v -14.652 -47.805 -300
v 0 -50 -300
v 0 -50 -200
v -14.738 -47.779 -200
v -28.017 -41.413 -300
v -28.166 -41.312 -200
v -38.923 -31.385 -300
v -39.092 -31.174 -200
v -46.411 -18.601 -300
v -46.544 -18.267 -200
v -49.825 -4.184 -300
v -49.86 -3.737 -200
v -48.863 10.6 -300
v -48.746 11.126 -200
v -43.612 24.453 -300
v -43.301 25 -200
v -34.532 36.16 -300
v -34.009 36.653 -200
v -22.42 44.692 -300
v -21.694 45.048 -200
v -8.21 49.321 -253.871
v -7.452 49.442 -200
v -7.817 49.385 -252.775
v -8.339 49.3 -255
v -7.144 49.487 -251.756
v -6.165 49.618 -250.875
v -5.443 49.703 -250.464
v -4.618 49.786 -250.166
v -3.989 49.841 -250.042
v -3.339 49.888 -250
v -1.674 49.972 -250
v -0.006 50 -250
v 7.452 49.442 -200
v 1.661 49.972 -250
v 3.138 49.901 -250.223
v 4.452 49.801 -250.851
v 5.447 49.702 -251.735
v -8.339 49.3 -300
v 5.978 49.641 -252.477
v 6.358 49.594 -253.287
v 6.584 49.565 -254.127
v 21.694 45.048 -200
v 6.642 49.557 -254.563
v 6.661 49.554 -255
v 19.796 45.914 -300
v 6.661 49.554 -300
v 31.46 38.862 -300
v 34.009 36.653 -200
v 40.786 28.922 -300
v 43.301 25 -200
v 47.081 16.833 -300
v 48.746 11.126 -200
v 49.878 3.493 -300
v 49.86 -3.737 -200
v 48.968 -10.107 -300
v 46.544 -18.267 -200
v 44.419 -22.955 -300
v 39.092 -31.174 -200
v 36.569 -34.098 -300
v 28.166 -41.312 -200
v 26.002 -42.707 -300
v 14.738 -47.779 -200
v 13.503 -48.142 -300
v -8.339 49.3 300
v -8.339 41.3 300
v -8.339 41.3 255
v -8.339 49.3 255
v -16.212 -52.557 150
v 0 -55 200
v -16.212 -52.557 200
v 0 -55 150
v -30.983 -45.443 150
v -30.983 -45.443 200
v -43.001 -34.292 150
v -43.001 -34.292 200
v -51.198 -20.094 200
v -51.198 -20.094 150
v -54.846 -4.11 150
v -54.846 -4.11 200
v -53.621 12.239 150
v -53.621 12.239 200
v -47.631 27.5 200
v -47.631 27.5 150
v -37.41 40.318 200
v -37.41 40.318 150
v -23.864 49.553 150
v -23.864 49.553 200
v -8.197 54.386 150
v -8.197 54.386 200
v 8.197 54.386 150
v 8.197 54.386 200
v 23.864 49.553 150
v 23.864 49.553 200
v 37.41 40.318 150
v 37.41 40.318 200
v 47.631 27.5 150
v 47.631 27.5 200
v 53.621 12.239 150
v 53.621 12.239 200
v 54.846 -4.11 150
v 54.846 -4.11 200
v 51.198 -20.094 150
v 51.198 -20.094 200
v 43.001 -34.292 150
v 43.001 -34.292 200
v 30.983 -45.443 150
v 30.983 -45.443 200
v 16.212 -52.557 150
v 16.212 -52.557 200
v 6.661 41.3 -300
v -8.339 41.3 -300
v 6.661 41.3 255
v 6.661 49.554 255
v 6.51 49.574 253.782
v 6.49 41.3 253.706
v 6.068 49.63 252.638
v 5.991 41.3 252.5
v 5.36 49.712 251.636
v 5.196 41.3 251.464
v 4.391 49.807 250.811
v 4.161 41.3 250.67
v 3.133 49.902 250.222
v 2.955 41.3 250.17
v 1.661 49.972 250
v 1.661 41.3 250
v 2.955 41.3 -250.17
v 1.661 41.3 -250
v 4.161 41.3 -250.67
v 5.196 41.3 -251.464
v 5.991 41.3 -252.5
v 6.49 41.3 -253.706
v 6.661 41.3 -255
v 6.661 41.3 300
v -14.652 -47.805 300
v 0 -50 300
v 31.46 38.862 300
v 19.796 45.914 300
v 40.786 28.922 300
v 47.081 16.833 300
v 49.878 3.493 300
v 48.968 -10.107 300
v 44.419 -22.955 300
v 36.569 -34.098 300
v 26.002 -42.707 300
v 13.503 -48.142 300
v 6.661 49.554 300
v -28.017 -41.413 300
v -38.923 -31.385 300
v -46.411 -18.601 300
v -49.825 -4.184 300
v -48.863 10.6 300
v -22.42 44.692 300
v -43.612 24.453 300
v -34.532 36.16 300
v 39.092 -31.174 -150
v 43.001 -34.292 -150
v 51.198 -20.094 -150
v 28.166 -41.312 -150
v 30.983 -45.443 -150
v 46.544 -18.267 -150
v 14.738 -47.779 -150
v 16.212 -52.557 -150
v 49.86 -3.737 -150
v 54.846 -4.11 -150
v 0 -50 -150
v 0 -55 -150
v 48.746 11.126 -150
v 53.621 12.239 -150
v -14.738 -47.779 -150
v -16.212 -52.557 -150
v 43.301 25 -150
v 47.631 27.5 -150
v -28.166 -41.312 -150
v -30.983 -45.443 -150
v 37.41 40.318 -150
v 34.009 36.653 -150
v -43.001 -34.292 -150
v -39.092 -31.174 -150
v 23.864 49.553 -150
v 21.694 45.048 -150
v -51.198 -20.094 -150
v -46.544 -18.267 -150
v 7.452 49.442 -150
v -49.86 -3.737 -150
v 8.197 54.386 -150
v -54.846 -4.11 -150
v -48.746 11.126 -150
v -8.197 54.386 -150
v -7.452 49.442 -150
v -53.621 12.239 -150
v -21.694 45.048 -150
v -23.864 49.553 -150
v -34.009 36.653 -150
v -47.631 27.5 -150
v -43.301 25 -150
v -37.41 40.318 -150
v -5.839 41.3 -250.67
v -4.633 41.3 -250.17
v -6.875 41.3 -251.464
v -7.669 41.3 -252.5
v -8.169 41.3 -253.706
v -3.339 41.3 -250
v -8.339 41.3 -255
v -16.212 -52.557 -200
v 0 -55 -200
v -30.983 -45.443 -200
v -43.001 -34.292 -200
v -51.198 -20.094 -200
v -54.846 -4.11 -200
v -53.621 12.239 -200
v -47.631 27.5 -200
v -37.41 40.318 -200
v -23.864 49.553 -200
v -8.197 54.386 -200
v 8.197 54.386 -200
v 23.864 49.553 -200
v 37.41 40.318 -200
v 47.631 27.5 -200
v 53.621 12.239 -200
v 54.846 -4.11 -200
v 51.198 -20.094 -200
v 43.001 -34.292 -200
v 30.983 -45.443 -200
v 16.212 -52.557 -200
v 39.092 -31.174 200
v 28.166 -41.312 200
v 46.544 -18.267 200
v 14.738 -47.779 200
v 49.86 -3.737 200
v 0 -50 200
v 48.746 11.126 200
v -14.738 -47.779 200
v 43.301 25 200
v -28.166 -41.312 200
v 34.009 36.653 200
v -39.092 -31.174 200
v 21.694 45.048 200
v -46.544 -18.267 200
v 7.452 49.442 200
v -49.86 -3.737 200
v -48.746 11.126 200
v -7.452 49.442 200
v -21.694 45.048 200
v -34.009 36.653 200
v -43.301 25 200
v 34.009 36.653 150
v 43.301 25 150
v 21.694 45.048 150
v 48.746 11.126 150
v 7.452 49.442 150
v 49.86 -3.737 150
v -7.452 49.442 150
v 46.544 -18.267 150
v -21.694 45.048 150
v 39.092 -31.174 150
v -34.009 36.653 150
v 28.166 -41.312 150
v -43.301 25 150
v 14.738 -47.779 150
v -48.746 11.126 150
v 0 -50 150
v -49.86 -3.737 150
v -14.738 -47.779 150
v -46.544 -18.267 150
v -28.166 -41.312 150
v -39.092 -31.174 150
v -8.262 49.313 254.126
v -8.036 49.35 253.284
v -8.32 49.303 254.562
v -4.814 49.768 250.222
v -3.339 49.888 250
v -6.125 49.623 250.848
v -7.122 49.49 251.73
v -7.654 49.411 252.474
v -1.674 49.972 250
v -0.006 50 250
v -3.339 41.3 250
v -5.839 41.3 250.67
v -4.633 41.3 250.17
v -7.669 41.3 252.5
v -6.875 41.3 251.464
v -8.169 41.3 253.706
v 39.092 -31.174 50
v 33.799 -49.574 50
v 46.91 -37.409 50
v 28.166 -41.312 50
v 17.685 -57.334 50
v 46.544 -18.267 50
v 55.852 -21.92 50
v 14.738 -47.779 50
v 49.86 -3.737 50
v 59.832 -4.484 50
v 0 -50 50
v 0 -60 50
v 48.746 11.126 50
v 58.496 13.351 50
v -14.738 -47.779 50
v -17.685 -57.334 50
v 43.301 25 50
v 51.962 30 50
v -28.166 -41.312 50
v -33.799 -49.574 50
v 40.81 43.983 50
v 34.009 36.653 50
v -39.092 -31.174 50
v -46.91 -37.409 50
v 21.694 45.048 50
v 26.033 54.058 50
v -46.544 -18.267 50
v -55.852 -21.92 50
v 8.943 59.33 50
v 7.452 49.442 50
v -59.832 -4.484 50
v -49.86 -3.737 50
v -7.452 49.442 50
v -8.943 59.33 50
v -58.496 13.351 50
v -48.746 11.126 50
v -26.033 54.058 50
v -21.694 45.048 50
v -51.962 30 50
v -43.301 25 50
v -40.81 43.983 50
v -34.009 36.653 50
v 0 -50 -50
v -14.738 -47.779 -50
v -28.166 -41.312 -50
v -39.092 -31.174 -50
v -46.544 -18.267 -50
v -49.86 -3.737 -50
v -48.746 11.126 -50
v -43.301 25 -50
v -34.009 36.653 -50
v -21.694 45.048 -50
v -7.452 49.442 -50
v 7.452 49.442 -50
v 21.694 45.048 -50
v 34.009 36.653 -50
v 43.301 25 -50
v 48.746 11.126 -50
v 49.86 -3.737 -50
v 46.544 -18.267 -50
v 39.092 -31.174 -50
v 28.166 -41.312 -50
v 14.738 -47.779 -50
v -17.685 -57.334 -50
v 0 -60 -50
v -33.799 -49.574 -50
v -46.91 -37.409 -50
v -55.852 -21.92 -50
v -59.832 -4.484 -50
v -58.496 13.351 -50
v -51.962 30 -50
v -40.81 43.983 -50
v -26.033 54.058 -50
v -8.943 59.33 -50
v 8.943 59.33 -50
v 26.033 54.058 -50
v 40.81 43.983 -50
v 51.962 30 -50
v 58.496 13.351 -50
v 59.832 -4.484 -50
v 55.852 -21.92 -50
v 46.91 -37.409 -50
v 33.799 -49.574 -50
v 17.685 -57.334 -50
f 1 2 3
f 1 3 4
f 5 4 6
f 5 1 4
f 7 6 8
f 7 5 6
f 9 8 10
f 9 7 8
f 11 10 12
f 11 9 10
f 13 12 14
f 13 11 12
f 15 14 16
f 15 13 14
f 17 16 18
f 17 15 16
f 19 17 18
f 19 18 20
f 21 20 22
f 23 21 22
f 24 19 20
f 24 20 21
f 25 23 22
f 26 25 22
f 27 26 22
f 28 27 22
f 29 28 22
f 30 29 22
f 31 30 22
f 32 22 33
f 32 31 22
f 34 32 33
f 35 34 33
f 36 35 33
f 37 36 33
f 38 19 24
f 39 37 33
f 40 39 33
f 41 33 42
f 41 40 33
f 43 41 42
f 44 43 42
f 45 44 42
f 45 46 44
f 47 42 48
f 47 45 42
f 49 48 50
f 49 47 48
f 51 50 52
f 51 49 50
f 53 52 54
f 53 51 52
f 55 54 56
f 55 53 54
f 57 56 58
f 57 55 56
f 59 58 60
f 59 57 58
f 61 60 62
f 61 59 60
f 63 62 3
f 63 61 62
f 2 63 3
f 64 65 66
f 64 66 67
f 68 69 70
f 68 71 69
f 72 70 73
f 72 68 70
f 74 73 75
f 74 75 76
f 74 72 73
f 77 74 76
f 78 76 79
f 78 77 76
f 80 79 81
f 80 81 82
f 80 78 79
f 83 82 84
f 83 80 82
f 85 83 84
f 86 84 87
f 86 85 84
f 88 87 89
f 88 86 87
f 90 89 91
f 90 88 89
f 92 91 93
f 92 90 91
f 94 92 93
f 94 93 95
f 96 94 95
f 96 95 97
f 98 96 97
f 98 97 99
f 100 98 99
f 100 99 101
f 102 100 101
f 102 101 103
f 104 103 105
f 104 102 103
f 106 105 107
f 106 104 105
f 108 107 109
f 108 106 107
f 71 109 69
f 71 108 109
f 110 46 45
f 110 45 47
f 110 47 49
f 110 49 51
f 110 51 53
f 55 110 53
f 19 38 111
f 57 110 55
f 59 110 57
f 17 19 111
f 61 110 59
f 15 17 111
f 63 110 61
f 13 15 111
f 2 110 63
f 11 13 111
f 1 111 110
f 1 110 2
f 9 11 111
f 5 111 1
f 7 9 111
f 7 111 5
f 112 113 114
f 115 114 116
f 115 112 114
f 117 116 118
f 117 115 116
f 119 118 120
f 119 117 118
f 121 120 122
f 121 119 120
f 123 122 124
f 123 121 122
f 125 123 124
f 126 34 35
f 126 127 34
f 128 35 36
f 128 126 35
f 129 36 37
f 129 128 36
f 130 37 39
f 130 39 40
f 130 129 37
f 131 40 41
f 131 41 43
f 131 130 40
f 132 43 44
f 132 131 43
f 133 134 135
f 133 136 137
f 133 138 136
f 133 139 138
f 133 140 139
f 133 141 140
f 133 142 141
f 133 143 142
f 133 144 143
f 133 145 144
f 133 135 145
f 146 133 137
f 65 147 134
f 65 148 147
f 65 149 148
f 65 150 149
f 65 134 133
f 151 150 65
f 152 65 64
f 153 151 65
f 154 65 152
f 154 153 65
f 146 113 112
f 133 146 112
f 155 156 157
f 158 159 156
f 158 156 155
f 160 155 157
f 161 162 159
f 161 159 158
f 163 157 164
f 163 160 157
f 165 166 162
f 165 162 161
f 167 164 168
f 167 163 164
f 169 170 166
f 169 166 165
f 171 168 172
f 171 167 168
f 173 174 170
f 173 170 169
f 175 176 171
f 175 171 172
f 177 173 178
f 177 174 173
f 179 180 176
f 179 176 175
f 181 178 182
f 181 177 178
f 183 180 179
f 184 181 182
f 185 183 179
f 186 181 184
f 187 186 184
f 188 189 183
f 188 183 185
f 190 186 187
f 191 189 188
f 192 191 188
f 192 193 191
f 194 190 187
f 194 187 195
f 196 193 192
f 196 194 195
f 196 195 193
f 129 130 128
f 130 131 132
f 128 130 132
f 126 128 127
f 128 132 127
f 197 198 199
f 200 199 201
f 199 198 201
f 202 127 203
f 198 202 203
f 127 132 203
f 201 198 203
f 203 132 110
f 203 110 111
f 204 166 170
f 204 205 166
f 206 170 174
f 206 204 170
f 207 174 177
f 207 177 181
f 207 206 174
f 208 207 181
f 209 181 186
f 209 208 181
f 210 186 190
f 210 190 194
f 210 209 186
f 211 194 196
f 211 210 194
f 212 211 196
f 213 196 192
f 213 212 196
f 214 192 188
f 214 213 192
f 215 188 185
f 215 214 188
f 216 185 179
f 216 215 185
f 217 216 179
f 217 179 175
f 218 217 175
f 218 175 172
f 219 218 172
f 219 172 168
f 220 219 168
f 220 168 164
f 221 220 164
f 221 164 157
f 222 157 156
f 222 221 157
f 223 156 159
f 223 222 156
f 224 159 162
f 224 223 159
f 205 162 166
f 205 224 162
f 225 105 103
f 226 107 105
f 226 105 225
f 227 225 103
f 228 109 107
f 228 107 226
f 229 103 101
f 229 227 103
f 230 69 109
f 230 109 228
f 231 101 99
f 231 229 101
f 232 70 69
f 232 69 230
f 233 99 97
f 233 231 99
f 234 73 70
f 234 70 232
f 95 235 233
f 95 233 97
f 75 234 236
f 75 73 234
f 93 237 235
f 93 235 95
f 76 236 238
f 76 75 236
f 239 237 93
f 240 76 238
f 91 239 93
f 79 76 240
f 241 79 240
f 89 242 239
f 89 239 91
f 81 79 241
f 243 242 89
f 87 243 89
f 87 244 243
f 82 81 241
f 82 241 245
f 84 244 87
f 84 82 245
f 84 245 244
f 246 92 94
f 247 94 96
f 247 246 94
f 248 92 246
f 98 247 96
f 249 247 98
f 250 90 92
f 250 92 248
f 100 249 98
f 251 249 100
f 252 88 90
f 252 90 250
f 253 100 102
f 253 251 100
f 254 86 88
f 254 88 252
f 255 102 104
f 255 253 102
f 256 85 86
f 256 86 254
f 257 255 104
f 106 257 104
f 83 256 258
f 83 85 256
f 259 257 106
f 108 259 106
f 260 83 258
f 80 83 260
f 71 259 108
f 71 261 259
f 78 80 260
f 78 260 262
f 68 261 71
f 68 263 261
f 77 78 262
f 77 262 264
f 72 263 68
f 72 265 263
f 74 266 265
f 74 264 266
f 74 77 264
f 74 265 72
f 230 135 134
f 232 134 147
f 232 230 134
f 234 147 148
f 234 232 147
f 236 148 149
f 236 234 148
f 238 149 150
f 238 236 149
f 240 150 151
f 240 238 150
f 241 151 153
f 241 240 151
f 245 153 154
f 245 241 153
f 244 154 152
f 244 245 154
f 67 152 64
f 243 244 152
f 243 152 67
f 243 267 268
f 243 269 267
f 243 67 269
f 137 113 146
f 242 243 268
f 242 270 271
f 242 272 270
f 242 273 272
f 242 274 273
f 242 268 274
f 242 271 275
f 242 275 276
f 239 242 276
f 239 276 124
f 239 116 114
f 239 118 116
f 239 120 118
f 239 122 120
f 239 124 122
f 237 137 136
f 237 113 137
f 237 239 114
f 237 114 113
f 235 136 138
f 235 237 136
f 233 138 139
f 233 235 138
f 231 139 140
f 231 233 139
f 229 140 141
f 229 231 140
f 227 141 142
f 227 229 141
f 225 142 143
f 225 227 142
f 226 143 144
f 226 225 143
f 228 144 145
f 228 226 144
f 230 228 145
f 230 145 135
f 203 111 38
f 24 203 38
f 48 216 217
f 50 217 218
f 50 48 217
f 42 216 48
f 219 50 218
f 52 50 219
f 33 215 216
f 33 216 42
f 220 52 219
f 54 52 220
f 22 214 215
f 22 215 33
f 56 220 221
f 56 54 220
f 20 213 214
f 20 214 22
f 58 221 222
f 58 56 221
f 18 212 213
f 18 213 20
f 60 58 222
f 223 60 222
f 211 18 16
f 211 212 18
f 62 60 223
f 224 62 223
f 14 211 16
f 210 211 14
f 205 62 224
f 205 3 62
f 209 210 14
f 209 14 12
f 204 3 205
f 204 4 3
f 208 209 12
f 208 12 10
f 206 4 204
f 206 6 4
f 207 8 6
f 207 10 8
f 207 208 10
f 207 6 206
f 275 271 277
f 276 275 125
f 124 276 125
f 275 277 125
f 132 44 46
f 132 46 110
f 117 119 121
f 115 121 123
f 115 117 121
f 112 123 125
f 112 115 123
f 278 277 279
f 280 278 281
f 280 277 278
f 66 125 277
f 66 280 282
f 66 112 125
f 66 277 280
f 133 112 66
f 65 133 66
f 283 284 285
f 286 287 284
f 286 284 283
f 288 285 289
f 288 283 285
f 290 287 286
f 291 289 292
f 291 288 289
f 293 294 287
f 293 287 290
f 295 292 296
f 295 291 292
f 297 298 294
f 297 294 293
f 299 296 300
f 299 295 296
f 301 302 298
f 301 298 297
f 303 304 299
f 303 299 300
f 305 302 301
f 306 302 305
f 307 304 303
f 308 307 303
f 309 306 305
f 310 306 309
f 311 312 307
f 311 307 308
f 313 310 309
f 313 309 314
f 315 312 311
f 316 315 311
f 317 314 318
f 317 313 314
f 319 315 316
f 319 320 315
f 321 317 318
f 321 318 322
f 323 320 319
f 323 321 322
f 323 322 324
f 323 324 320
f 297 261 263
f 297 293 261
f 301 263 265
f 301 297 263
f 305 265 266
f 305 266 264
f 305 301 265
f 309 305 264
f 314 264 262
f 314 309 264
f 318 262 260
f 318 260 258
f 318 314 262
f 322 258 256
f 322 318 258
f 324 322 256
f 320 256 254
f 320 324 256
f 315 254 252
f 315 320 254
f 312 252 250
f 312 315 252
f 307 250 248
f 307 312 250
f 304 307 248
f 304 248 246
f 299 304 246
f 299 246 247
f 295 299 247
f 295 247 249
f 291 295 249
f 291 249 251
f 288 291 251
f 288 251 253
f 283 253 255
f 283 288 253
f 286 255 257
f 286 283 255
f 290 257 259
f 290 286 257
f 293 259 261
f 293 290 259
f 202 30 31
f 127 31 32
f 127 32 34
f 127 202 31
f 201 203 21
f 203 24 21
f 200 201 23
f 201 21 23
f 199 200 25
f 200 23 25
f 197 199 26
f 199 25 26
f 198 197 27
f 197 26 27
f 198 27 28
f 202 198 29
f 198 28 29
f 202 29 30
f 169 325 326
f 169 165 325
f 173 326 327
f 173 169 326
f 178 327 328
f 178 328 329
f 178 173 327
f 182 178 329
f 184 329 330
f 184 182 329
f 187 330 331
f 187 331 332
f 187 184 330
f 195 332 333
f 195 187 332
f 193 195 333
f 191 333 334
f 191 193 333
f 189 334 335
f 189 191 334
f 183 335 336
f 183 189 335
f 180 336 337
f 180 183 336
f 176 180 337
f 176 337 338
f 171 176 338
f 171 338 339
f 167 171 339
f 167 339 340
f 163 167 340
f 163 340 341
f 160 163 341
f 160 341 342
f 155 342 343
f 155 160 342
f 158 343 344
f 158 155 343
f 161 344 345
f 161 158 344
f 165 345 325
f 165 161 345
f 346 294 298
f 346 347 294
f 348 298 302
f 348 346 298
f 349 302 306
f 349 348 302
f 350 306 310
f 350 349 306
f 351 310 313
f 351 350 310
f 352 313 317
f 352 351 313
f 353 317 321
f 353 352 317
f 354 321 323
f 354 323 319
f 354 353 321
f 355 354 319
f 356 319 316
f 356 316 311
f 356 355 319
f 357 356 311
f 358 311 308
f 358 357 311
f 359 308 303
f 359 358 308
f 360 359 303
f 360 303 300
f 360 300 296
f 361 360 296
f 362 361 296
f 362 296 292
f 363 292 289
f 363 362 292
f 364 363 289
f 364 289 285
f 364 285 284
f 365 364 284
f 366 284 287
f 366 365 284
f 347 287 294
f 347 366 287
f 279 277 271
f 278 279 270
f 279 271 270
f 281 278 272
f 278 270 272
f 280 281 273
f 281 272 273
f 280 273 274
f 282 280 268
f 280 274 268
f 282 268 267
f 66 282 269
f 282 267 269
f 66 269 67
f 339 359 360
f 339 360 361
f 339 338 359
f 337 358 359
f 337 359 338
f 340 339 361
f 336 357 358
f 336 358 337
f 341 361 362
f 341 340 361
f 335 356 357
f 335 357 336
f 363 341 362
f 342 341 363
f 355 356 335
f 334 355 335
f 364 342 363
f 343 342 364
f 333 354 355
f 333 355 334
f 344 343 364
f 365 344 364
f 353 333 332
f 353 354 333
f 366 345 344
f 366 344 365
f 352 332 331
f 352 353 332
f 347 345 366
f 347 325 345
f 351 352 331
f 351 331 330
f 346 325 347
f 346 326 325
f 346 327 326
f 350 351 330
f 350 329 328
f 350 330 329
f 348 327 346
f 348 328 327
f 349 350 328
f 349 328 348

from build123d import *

# Parameters (mm, degrees)
F3_DEPTH = 50
F4_R     = 5


# Not quite as in the source:
# - a pattern or mirror of a feature is missing from the dataset's text; its kind, count and spacing are read off the source's solid


with BuildPart() as f1:
    # F0 (on Right) → F1 (revolve)
    with BuildSketch(Plane.YZ):
        Polygon((-55, -150), (-55, -200), (-50, -200), (-50, -300), (0, -300), (0, 300), (-50, 300), (-50, 200), (-55, 200), (-55, 150), (-50, 150), (-50, 50), (-60, 50), (-60, -50), (-50, -50), (-50, -150), align=None)
    revolve(axis=Axis((0, 0, 0), (0, 0, -1)))

    # F2 (on face) → F3 (cut)
    with BuildSketch(Plane(origin=(0, 0, -300), x_dir=(1, 0, 0), z_dir=(0, 0, -1))):
        with BuildLine():
            Line((-8.3391469531, -41.2996818255), (-8.3391469531, -49.2996818255))
            ThreePointArc((-8.3391469531, -49.2996818255), (-0.8487525257, -49.9927956725), (6.6608530469, -49.5543442766))
            Line((6.6608530469, -49.5543442766), (6.6608530469, -41.2996818255))
            Line((6.6608530469, -41.2996818255), (-8.3391469531, -41.2996818255))
        make_face()
    f3 = extrude(amount=-F3_DEPTH, mode=Mode.SUBTRACT)

    # F3_copies: F3 across plane
    add(f3.mirror(Plane.XY), mode=Mode.SUBTRACT)

    # F4
    f4_edges = [f1.edges().sort_by_distance(p)[0] for p in [
        (6.660853, 45.427013, -250),
        (-8.339147, 45.299682, -250),
        (6.660853, 45.427013, 250),
        (-8.339147, 45.299682, 250),
    ]]
    fillet(f4_edges, radius=F4_R)


solid = f1.part
